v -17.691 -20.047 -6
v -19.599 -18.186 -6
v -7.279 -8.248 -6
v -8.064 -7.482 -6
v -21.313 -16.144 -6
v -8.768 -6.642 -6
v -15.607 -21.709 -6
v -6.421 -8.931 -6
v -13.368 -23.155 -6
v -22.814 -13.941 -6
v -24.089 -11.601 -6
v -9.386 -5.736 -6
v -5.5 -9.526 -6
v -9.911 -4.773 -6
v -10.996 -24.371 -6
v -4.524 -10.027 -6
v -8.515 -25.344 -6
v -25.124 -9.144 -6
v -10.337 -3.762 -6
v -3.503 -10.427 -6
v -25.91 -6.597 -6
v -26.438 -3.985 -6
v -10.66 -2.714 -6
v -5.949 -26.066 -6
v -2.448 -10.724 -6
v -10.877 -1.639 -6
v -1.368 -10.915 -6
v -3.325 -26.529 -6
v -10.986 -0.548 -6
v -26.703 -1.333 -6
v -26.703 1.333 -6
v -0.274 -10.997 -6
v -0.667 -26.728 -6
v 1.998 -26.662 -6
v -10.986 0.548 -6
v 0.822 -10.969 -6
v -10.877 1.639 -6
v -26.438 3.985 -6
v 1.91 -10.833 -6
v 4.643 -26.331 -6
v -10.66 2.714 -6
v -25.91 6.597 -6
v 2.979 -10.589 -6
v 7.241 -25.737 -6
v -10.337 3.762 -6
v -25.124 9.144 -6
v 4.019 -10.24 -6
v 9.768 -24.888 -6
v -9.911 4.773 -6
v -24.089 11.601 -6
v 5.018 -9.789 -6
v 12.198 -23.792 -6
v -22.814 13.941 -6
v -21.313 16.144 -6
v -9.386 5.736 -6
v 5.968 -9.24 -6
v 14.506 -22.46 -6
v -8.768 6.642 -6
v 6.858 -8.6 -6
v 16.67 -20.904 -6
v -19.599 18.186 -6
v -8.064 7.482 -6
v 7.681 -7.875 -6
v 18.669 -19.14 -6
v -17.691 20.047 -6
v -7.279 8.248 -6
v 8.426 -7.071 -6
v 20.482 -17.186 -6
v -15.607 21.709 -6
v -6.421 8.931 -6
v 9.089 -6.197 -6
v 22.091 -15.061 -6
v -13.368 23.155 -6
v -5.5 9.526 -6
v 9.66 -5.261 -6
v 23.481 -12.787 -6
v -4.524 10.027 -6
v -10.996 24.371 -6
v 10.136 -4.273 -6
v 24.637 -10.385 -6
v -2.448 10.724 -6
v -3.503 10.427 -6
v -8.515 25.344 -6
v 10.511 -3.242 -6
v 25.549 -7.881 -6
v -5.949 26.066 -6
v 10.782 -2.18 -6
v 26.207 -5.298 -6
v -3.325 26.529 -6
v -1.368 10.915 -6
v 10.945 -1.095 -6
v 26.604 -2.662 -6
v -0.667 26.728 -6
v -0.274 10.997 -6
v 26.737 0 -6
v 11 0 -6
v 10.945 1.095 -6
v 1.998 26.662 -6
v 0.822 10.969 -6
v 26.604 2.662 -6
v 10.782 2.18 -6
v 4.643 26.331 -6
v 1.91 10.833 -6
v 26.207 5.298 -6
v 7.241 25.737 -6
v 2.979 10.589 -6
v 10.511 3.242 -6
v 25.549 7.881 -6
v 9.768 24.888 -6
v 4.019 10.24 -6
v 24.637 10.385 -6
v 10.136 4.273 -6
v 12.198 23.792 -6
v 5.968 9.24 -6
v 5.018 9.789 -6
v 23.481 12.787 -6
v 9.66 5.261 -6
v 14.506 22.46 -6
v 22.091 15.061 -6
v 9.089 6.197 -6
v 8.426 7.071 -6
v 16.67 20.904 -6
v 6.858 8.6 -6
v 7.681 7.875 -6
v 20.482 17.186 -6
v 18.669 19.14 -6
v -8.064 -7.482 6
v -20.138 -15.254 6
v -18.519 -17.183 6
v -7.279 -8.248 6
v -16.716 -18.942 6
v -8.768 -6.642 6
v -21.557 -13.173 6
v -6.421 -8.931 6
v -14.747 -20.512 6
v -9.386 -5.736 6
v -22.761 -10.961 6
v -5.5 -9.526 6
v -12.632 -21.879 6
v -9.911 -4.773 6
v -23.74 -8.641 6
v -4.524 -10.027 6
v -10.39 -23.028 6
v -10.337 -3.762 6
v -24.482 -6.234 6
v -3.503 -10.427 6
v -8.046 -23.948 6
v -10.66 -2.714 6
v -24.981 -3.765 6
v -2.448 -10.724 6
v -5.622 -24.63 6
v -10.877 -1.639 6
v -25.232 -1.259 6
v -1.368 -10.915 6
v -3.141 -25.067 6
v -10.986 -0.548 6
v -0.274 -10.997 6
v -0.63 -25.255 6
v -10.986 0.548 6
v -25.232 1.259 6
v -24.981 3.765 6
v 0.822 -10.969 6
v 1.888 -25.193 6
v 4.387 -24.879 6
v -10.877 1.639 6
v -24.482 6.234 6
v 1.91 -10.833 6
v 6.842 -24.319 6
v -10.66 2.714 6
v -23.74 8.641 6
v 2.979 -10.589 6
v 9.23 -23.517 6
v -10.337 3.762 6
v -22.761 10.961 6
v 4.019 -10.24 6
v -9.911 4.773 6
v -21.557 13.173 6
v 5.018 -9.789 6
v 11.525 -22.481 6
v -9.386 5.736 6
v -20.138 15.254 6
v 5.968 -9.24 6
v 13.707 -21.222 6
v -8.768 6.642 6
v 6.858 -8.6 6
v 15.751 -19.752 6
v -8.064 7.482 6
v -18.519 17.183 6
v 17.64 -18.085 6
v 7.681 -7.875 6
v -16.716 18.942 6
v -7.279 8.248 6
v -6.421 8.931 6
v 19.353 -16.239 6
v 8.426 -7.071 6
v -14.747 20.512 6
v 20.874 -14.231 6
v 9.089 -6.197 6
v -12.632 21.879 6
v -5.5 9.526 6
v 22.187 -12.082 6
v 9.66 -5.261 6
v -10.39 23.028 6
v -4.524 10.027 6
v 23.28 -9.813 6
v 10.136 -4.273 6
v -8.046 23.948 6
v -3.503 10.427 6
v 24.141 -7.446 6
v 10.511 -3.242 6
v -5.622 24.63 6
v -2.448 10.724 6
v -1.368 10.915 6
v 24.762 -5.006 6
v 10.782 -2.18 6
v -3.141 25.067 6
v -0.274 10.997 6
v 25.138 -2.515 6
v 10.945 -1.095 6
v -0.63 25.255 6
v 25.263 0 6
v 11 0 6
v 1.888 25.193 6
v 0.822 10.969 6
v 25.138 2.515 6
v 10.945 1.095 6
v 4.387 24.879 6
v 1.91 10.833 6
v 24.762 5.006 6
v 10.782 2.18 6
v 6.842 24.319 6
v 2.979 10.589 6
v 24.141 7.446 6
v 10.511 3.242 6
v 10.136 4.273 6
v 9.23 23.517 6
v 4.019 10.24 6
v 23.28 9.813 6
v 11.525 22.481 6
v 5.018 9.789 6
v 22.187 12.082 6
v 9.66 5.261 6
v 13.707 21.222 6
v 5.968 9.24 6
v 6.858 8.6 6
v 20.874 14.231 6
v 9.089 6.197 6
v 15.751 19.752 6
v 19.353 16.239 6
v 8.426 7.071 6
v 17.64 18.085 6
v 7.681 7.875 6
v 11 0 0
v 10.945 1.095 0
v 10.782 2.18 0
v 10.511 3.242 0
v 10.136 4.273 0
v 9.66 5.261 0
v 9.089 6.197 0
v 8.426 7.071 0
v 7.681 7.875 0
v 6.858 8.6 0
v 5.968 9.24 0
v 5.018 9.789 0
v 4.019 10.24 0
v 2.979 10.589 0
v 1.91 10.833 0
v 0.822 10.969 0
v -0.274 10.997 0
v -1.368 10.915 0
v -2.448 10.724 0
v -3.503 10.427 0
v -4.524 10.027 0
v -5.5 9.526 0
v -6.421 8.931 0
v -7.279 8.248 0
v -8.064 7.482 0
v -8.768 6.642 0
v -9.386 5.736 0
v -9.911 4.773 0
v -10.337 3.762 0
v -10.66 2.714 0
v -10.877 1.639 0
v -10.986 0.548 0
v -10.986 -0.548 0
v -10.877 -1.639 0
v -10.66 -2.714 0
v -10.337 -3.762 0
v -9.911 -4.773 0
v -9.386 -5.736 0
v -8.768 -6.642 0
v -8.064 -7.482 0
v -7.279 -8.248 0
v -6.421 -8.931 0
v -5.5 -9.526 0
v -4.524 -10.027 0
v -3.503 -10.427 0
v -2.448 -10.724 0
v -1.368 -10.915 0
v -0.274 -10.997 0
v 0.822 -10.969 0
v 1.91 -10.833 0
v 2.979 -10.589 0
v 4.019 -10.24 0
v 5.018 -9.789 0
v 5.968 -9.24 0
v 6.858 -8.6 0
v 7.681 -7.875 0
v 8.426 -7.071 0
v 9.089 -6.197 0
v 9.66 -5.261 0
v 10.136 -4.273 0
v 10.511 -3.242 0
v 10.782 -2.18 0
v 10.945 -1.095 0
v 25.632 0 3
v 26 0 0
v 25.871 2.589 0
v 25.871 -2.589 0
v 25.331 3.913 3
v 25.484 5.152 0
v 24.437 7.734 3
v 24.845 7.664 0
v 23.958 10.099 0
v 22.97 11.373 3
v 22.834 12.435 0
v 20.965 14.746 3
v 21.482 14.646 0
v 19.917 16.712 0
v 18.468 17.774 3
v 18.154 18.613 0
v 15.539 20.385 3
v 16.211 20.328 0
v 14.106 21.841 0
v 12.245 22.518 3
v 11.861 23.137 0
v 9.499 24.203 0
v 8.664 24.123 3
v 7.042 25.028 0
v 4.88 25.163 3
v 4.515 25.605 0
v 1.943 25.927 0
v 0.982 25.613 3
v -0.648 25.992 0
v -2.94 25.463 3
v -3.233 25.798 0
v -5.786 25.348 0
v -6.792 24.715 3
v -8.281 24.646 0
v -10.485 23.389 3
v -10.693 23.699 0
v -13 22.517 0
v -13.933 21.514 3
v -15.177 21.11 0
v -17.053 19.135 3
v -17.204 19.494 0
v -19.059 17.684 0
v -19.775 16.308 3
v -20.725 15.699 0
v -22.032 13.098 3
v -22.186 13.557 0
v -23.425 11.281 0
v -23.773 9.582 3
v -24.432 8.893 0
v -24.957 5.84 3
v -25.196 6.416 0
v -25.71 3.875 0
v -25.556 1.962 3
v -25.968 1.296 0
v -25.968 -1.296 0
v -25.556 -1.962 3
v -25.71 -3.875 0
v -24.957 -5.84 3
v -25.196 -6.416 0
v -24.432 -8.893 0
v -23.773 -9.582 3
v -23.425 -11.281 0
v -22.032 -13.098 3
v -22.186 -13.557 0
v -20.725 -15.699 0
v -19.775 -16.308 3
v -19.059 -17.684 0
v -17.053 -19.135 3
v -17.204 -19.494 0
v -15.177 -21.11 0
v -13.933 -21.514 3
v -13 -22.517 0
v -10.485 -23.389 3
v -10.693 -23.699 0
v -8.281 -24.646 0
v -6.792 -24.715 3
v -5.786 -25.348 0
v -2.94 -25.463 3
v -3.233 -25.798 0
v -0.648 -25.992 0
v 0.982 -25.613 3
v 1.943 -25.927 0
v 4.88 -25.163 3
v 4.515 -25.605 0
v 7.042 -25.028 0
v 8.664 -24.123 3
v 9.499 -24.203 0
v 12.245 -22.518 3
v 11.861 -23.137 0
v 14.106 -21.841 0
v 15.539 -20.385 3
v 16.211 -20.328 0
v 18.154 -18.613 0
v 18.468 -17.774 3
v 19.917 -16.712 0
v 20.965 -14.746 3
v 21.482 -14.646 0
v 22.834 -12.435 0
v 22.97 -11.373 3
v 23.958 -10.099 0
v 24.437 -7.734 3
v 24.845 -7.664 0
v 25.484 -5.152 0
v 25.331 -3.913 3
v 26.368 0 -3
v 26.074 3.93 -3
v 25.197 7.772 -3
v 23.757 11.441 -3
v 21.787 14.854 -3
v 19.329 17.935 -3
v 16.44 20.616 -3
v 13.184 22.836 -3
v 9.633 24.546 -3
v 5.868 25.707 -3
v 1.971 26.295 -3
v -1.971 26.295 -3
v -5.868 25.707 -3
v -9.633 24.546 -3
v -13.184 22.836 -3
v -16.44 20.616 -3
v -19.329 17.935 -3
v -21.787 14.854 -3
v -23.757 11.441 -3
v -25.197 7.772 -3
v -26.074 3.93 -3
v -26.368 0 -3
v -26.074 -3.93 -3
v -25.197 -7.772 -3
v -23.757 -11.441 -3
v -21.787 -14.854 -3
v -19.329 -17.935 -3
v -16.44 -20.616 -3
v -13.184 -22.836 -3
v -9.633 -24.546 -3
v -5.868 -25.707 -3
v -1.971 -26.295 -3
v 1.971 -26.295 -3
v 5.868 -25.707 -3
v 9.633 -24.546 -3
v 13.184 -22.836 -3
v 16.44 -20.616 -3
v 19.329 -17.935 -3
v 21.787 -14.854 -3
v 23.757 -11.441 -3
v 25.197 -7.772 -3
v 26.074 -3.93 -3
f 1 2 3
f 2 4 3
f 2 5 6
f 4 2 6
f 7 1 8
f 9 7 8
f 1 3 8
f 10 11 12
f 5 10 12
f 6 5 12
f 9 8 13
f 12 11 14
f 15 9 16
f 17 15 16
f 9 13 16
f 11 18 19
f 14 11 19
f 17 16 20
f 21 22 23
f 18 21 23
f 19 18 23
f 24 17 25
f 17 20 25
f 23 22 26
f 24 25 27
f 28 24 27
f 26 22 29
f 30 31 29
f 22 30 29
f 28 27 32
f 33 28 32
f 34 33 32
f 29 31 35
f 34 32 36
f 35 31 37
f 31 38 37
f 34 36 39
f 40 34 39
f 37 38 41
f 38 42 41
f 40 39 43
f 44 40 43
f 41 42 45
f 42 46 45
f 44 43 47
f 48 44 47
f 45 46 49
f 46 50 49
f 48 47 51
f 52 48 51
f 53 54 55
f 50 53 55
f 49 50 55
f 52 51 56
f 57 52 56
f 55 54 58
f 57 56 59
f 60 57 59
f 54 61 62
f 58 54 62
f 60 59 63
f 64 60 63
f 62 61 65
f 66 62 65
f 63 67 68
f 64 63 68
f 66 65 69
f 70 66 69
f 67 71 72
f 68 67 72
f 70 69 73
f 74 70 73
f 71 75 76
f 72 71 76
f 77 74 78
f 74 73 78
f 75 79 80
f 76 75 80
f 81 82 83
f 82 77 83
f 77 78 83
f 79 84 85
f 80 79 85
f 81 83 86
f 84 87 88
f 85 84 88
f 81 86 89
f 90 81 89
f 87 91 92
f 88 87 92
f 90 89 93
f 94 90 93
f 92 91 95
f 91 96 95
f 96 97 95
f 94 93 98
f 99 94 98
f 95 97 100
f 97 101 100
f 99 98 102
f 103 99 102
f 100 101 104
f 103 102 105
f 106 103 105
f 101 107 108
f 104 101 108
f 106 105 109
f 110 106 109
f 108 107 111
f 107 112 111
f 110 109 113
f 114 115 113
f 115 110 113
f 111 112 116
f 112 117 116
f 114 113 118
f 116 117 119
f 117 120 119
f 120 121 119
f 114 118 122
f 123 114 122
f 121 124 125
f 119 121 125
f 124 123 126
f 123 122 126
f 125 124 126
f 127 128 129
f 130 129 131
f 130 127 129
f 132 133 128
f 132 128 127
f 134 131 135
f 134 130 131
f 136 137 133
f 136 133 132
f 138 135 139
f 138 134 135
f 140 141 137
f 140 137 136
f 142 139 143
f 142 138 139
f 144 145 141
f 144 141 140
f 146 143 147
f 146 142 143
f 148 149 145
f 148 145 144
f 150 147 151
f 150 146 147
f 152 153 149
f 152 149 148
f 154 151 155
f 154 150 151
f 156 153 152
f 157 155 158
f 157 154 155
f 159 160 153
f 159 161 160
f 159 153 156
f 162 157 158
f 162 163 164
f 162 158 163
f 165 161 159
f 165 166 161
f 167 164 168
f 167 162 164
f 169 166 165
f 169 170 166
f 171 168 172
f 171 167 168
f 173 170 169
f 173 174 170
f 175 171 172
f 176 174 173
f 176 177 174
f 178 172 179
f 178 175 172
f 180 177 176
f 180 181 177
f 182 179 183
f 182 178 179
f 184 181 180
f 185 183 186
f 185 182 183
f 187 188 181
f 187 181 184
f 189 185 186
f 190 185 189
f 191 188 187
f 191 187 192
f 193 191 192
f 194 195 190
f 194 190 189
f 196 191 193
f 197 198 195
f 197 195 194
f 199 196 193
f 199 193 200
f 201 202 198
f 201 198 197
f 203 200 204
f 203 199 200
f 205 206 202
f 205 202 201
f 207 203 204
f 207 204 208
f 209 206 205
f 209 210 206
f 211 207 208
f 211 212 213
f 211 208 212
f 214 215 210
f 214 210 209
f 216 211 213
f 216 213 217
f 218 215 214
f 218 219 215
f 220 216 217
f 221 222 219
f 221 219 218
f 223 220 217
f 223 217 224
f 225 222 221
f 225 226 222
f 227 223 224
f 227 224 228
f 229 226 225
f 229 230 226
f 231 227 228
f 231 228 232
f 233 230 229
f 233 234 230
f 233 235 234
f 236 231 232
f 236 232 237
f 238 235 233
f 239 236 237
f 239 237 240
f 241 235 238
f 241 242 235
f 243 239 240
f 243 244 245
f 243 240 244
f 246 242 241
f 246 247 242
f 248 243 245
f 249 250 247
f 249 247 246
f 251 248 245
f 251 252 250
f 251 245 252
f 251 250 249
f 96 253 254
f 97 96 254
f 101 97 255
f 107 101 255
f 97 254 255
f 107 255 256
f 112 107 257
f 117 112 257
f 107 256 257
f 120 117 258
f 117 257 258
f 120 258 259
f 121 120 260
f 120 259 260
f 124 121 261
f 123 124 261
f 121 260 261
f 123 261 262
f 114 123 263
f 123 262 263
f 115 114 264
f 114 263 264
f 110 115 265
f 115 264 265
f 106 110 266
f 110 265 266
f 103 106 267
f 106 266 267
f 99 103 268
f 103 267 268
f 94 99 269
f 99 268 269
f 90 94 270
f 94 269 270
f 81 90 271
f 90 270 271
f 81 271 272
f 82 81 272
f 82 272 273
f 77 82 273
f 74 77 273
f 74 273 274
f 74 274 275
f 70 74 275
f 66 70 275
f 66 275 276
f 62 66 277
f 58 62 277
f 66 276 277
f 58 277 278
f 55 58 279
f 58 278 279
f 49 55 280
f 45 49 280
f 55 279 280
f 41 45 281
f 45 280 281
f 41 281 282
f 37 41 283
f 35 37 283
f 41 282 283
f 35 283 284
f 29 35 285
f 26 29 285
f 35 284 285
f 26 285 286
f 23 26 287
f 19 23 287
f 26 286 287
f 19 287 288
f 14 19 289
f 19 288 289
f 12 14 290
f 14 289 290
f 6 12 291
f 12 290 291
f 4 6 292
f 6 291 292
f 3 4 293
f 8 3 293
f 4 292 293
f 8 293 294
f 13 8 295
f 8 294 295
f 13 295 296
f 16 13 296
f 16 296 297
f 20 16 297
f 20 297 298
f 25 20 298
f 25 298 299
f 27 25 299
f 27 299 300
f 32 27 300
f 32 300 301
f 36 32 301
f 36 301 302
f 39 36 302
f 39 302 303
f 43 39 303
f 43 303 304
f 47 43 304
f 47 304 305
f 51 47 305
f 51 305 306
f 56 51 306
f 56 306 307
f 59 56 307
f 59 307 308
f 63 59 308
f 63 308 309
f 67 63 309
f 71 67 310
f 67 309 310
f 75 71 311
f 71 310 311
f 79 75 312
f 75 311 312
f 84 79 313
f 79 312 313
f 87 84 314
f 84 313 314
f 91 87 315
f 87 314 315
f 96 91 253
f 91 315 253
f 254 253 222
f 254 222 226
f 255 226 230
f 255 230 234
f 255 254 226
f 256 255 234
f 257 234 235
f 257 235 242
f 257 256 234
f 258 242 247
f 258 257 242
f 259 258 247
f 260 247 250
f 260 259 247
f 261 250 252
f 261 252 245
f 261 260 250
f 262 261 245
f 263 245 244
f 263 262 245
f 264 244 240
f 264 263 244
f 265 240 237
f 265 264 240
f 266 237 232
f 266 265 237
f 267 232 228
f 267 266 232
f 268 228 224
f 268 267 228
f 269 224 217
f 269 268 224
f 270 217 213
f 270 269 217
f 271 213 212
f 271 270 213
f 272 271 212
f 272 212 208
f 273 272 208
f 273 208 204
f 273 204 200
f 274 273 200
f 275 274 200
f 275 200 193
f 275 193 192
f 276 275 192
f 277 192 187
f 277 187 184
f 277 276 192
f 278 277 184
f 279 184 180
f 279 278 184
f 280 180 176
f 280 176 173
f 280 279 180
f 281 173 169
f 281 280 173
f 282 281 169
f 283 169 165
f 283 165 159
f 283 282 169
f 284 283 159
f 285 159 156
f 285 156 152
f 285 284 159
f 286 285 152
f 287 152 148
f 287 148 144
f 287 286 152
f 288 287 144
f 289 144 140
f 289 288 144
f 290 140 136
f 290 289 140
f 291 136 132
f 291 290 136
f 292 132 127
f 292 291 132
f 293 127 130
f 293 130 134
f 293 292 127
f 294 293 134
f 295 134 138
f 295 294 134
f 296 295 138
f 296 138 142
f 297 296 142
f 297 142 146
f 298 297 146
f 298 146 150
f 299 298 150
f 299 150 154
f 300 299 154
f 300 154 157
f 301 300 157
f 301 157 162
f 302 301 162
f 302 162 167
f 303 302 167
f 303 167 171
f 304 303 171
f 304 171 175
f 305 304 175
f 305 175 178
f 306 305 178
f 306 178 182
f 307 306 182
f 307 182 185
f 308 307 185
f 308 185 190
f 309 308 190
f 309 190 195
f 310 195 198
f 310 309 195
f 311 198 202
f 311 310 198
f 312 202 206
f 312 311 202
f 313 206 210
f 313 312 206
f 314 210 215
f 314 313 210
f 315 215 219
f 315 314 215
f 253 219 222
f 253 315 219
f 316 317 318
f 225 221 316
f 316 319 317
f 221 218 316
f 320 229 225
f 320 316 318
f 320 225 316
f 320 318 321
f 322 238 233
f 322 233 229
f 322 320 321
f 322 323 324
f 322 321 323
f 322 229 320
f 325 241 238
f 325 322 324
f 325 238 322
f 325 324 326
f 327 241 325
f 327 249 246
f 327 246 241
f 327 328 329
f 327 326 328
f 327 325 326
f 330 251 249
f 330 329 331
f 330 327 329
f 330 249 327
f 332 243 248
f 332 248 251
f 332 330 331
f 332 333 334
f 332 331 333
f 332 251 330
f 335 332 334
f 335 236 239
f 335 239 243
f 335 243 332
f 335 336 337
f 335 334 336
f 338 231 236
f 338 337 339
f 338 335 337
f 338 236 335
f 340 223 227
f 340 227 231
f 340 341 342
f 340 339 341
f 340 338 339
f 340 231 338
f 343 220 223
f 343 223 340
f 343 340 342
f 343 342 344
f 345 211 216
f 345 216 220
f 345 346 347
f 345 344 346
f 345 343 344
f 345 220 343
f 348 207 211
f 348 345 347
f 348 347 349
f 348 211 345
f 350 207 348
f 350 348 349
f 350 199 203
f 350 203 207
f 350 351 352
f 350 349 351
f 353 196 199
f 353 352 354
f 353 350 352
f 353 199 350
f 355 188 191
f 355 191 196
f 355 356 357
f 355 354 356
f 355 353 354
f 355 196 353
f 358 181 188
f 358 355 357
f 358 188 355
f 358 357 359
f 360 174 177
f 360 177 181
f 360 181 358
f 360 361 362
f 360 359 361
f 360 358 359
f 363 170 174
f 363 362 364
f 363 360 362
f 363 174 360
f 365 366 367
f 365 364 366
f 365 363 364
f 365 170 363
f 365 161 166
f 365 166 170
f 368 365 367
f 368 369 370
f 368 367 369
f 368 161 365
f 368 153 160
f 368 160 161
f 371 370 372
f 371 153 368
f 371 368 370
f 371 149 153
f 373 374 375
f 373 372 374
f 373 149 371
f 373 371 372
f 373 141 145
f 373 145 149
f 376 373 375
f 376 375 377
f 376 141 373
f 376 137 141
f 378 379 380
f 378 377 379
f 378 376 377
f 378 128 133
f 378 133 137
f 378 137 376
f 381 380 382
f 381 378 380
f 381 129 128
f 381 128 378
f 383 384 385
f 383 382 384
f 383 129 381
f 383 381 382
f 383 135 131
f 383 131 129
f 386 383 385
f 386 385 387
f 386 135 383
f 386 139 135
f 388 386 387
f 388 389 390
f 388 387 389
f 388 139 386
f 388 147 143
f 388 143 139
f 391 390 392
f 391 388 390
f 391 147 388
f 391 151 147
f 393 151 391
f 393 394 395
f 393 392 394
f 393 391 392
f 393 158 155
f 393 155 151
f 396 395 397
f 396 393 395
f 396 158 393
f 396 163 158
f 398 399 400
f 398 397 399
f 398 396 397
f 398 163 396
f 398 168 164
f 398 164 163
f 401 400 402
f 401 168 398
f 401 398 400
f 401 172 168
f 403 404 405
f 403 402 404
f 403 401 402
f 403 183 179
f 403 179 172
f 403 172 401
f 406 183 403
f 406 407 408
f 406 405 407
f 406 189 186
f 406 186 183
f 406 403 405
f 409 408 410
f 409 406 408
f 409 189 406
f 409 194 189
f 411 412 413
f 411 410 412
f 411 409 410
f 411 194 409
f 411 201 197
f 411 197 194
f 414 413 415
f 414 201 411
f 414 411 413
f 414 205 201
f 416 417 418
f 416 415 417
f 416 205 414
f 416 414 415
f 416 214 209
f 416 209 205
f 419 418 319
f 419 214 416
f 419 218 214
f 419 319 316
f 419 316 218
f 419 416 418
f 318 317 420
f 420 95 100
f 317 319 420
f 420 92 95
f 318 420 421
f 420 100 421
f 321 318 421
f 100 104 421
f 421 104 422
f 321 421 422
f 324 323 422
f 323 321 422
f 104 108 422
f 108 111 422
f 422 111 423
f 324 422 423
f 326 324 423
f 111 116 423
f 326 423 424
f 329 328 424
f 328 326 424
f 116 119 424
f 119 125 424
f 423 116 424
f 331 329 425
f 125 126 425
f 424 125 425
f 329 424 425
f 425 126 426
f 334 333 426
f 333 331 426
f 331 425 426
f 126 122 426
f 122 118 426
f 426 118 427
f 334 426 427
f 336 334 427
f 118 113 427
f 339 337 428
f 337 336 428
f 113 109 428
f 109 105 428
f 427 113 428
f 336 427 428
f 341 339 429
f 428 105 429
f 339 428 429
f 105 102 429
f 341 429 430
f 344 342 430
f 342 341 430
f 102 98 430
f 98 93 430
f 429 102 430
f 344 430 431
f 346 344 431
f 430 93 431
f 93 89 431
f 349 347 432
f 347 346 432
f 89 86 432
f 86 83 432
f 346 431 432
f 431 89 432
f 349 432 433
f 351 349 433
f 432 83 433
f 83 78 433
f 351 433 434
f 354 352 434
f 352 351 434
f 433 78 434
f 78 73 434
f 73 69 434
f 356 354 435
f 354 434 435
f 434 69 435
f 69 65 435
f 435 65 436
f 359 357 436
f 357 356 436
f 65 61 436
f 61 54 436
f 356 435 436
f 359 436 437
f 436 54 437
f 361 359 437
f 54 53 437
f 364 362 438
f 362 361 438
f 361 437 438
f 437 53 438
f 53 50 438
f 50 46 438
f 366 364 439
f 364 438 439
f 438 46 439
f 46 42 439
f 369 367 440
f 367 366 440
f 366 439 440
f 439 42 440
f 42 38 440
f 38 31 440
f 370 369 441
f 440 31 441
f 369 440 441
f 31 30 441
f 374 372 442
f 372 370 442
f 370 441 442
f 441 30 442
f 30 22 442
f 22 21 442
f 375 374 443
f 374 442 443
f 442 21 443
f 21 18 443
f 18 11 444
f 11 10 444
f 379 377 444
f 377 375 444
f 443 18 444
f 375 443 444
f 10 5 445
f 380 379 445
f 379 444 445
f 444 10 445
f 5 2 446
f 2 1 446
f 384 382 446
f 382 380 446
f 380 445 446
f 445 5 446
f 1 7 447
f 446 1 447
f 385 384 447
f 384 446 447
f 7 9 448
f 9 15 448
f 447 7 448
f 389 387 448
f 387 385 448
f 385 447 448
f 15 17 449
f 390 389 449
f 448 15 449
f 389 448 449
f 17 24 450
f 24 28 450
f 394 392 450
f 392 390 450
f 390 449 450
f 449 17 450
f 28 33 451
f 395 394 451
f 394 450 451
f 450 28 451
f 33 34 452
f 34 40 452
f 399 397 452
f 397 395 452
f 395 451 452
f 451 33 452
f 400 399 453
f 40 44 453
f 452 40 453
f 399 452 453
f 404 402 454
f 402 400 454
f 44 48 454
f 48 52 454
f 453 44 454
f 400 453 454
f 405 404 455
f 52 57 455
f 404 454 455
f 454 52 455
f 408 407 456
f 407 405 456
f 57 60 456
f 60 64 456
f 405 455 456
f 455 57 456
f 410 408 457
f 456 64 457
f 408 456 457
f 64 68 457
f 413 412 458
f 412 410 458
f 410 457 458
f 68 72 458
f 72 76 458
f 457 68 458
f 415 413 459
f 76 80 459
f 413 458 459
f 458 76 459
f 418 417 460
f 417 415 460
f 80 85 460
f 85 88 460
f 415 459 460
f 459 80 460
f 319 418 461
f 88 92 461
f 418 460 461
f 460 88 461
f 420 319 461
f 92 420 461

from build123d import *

# Parameters (mm, degrees)
F0_R          = 26
F0_R_2        = 11
F1_DEPTH      = 6
F1_TAPER      = 7
F2_DEPTH      = 6
F2_TAPER      = -7
F3_DEPTH      = 6
F3_DEPTH_BACK = 6


with BuildPart() as f1:
    # F0 (on Top) → F1 (new body)
    with BuildSketch(Plane.XY):
        Circle(F0_R)
        Circle(F0_R_2, mode=Mode.SUBTRACT)
        Circle(F0_R_2)
    extrude(amount=F1_DEPTH, taper=F1_TAPER)

    # F0 (on Top) → F2 (join)
    with BuildSketch(Plane.XY):
        Circle(F0_R)
        Circle(F0_R_2, mode=Mode.SUBTRACT)
        Circle(F0_R_2)
    extrude(amount=-F2_DEPTH, taper=F2_TAPER)

    # F0 (on Top) → F3 (cut, two sides)
    with BuildSketch(Plane.XY) as f3_sk:
        Circle(F0_R_2)
    extrude(amount=F3_DEPTH, mode=Mode.SUBTRACT)
    extrude(f3_sk.sketch, amount=-F3_DEPTH_BACK, mode=Mode.SUBTRACT)


solid = f1.part
